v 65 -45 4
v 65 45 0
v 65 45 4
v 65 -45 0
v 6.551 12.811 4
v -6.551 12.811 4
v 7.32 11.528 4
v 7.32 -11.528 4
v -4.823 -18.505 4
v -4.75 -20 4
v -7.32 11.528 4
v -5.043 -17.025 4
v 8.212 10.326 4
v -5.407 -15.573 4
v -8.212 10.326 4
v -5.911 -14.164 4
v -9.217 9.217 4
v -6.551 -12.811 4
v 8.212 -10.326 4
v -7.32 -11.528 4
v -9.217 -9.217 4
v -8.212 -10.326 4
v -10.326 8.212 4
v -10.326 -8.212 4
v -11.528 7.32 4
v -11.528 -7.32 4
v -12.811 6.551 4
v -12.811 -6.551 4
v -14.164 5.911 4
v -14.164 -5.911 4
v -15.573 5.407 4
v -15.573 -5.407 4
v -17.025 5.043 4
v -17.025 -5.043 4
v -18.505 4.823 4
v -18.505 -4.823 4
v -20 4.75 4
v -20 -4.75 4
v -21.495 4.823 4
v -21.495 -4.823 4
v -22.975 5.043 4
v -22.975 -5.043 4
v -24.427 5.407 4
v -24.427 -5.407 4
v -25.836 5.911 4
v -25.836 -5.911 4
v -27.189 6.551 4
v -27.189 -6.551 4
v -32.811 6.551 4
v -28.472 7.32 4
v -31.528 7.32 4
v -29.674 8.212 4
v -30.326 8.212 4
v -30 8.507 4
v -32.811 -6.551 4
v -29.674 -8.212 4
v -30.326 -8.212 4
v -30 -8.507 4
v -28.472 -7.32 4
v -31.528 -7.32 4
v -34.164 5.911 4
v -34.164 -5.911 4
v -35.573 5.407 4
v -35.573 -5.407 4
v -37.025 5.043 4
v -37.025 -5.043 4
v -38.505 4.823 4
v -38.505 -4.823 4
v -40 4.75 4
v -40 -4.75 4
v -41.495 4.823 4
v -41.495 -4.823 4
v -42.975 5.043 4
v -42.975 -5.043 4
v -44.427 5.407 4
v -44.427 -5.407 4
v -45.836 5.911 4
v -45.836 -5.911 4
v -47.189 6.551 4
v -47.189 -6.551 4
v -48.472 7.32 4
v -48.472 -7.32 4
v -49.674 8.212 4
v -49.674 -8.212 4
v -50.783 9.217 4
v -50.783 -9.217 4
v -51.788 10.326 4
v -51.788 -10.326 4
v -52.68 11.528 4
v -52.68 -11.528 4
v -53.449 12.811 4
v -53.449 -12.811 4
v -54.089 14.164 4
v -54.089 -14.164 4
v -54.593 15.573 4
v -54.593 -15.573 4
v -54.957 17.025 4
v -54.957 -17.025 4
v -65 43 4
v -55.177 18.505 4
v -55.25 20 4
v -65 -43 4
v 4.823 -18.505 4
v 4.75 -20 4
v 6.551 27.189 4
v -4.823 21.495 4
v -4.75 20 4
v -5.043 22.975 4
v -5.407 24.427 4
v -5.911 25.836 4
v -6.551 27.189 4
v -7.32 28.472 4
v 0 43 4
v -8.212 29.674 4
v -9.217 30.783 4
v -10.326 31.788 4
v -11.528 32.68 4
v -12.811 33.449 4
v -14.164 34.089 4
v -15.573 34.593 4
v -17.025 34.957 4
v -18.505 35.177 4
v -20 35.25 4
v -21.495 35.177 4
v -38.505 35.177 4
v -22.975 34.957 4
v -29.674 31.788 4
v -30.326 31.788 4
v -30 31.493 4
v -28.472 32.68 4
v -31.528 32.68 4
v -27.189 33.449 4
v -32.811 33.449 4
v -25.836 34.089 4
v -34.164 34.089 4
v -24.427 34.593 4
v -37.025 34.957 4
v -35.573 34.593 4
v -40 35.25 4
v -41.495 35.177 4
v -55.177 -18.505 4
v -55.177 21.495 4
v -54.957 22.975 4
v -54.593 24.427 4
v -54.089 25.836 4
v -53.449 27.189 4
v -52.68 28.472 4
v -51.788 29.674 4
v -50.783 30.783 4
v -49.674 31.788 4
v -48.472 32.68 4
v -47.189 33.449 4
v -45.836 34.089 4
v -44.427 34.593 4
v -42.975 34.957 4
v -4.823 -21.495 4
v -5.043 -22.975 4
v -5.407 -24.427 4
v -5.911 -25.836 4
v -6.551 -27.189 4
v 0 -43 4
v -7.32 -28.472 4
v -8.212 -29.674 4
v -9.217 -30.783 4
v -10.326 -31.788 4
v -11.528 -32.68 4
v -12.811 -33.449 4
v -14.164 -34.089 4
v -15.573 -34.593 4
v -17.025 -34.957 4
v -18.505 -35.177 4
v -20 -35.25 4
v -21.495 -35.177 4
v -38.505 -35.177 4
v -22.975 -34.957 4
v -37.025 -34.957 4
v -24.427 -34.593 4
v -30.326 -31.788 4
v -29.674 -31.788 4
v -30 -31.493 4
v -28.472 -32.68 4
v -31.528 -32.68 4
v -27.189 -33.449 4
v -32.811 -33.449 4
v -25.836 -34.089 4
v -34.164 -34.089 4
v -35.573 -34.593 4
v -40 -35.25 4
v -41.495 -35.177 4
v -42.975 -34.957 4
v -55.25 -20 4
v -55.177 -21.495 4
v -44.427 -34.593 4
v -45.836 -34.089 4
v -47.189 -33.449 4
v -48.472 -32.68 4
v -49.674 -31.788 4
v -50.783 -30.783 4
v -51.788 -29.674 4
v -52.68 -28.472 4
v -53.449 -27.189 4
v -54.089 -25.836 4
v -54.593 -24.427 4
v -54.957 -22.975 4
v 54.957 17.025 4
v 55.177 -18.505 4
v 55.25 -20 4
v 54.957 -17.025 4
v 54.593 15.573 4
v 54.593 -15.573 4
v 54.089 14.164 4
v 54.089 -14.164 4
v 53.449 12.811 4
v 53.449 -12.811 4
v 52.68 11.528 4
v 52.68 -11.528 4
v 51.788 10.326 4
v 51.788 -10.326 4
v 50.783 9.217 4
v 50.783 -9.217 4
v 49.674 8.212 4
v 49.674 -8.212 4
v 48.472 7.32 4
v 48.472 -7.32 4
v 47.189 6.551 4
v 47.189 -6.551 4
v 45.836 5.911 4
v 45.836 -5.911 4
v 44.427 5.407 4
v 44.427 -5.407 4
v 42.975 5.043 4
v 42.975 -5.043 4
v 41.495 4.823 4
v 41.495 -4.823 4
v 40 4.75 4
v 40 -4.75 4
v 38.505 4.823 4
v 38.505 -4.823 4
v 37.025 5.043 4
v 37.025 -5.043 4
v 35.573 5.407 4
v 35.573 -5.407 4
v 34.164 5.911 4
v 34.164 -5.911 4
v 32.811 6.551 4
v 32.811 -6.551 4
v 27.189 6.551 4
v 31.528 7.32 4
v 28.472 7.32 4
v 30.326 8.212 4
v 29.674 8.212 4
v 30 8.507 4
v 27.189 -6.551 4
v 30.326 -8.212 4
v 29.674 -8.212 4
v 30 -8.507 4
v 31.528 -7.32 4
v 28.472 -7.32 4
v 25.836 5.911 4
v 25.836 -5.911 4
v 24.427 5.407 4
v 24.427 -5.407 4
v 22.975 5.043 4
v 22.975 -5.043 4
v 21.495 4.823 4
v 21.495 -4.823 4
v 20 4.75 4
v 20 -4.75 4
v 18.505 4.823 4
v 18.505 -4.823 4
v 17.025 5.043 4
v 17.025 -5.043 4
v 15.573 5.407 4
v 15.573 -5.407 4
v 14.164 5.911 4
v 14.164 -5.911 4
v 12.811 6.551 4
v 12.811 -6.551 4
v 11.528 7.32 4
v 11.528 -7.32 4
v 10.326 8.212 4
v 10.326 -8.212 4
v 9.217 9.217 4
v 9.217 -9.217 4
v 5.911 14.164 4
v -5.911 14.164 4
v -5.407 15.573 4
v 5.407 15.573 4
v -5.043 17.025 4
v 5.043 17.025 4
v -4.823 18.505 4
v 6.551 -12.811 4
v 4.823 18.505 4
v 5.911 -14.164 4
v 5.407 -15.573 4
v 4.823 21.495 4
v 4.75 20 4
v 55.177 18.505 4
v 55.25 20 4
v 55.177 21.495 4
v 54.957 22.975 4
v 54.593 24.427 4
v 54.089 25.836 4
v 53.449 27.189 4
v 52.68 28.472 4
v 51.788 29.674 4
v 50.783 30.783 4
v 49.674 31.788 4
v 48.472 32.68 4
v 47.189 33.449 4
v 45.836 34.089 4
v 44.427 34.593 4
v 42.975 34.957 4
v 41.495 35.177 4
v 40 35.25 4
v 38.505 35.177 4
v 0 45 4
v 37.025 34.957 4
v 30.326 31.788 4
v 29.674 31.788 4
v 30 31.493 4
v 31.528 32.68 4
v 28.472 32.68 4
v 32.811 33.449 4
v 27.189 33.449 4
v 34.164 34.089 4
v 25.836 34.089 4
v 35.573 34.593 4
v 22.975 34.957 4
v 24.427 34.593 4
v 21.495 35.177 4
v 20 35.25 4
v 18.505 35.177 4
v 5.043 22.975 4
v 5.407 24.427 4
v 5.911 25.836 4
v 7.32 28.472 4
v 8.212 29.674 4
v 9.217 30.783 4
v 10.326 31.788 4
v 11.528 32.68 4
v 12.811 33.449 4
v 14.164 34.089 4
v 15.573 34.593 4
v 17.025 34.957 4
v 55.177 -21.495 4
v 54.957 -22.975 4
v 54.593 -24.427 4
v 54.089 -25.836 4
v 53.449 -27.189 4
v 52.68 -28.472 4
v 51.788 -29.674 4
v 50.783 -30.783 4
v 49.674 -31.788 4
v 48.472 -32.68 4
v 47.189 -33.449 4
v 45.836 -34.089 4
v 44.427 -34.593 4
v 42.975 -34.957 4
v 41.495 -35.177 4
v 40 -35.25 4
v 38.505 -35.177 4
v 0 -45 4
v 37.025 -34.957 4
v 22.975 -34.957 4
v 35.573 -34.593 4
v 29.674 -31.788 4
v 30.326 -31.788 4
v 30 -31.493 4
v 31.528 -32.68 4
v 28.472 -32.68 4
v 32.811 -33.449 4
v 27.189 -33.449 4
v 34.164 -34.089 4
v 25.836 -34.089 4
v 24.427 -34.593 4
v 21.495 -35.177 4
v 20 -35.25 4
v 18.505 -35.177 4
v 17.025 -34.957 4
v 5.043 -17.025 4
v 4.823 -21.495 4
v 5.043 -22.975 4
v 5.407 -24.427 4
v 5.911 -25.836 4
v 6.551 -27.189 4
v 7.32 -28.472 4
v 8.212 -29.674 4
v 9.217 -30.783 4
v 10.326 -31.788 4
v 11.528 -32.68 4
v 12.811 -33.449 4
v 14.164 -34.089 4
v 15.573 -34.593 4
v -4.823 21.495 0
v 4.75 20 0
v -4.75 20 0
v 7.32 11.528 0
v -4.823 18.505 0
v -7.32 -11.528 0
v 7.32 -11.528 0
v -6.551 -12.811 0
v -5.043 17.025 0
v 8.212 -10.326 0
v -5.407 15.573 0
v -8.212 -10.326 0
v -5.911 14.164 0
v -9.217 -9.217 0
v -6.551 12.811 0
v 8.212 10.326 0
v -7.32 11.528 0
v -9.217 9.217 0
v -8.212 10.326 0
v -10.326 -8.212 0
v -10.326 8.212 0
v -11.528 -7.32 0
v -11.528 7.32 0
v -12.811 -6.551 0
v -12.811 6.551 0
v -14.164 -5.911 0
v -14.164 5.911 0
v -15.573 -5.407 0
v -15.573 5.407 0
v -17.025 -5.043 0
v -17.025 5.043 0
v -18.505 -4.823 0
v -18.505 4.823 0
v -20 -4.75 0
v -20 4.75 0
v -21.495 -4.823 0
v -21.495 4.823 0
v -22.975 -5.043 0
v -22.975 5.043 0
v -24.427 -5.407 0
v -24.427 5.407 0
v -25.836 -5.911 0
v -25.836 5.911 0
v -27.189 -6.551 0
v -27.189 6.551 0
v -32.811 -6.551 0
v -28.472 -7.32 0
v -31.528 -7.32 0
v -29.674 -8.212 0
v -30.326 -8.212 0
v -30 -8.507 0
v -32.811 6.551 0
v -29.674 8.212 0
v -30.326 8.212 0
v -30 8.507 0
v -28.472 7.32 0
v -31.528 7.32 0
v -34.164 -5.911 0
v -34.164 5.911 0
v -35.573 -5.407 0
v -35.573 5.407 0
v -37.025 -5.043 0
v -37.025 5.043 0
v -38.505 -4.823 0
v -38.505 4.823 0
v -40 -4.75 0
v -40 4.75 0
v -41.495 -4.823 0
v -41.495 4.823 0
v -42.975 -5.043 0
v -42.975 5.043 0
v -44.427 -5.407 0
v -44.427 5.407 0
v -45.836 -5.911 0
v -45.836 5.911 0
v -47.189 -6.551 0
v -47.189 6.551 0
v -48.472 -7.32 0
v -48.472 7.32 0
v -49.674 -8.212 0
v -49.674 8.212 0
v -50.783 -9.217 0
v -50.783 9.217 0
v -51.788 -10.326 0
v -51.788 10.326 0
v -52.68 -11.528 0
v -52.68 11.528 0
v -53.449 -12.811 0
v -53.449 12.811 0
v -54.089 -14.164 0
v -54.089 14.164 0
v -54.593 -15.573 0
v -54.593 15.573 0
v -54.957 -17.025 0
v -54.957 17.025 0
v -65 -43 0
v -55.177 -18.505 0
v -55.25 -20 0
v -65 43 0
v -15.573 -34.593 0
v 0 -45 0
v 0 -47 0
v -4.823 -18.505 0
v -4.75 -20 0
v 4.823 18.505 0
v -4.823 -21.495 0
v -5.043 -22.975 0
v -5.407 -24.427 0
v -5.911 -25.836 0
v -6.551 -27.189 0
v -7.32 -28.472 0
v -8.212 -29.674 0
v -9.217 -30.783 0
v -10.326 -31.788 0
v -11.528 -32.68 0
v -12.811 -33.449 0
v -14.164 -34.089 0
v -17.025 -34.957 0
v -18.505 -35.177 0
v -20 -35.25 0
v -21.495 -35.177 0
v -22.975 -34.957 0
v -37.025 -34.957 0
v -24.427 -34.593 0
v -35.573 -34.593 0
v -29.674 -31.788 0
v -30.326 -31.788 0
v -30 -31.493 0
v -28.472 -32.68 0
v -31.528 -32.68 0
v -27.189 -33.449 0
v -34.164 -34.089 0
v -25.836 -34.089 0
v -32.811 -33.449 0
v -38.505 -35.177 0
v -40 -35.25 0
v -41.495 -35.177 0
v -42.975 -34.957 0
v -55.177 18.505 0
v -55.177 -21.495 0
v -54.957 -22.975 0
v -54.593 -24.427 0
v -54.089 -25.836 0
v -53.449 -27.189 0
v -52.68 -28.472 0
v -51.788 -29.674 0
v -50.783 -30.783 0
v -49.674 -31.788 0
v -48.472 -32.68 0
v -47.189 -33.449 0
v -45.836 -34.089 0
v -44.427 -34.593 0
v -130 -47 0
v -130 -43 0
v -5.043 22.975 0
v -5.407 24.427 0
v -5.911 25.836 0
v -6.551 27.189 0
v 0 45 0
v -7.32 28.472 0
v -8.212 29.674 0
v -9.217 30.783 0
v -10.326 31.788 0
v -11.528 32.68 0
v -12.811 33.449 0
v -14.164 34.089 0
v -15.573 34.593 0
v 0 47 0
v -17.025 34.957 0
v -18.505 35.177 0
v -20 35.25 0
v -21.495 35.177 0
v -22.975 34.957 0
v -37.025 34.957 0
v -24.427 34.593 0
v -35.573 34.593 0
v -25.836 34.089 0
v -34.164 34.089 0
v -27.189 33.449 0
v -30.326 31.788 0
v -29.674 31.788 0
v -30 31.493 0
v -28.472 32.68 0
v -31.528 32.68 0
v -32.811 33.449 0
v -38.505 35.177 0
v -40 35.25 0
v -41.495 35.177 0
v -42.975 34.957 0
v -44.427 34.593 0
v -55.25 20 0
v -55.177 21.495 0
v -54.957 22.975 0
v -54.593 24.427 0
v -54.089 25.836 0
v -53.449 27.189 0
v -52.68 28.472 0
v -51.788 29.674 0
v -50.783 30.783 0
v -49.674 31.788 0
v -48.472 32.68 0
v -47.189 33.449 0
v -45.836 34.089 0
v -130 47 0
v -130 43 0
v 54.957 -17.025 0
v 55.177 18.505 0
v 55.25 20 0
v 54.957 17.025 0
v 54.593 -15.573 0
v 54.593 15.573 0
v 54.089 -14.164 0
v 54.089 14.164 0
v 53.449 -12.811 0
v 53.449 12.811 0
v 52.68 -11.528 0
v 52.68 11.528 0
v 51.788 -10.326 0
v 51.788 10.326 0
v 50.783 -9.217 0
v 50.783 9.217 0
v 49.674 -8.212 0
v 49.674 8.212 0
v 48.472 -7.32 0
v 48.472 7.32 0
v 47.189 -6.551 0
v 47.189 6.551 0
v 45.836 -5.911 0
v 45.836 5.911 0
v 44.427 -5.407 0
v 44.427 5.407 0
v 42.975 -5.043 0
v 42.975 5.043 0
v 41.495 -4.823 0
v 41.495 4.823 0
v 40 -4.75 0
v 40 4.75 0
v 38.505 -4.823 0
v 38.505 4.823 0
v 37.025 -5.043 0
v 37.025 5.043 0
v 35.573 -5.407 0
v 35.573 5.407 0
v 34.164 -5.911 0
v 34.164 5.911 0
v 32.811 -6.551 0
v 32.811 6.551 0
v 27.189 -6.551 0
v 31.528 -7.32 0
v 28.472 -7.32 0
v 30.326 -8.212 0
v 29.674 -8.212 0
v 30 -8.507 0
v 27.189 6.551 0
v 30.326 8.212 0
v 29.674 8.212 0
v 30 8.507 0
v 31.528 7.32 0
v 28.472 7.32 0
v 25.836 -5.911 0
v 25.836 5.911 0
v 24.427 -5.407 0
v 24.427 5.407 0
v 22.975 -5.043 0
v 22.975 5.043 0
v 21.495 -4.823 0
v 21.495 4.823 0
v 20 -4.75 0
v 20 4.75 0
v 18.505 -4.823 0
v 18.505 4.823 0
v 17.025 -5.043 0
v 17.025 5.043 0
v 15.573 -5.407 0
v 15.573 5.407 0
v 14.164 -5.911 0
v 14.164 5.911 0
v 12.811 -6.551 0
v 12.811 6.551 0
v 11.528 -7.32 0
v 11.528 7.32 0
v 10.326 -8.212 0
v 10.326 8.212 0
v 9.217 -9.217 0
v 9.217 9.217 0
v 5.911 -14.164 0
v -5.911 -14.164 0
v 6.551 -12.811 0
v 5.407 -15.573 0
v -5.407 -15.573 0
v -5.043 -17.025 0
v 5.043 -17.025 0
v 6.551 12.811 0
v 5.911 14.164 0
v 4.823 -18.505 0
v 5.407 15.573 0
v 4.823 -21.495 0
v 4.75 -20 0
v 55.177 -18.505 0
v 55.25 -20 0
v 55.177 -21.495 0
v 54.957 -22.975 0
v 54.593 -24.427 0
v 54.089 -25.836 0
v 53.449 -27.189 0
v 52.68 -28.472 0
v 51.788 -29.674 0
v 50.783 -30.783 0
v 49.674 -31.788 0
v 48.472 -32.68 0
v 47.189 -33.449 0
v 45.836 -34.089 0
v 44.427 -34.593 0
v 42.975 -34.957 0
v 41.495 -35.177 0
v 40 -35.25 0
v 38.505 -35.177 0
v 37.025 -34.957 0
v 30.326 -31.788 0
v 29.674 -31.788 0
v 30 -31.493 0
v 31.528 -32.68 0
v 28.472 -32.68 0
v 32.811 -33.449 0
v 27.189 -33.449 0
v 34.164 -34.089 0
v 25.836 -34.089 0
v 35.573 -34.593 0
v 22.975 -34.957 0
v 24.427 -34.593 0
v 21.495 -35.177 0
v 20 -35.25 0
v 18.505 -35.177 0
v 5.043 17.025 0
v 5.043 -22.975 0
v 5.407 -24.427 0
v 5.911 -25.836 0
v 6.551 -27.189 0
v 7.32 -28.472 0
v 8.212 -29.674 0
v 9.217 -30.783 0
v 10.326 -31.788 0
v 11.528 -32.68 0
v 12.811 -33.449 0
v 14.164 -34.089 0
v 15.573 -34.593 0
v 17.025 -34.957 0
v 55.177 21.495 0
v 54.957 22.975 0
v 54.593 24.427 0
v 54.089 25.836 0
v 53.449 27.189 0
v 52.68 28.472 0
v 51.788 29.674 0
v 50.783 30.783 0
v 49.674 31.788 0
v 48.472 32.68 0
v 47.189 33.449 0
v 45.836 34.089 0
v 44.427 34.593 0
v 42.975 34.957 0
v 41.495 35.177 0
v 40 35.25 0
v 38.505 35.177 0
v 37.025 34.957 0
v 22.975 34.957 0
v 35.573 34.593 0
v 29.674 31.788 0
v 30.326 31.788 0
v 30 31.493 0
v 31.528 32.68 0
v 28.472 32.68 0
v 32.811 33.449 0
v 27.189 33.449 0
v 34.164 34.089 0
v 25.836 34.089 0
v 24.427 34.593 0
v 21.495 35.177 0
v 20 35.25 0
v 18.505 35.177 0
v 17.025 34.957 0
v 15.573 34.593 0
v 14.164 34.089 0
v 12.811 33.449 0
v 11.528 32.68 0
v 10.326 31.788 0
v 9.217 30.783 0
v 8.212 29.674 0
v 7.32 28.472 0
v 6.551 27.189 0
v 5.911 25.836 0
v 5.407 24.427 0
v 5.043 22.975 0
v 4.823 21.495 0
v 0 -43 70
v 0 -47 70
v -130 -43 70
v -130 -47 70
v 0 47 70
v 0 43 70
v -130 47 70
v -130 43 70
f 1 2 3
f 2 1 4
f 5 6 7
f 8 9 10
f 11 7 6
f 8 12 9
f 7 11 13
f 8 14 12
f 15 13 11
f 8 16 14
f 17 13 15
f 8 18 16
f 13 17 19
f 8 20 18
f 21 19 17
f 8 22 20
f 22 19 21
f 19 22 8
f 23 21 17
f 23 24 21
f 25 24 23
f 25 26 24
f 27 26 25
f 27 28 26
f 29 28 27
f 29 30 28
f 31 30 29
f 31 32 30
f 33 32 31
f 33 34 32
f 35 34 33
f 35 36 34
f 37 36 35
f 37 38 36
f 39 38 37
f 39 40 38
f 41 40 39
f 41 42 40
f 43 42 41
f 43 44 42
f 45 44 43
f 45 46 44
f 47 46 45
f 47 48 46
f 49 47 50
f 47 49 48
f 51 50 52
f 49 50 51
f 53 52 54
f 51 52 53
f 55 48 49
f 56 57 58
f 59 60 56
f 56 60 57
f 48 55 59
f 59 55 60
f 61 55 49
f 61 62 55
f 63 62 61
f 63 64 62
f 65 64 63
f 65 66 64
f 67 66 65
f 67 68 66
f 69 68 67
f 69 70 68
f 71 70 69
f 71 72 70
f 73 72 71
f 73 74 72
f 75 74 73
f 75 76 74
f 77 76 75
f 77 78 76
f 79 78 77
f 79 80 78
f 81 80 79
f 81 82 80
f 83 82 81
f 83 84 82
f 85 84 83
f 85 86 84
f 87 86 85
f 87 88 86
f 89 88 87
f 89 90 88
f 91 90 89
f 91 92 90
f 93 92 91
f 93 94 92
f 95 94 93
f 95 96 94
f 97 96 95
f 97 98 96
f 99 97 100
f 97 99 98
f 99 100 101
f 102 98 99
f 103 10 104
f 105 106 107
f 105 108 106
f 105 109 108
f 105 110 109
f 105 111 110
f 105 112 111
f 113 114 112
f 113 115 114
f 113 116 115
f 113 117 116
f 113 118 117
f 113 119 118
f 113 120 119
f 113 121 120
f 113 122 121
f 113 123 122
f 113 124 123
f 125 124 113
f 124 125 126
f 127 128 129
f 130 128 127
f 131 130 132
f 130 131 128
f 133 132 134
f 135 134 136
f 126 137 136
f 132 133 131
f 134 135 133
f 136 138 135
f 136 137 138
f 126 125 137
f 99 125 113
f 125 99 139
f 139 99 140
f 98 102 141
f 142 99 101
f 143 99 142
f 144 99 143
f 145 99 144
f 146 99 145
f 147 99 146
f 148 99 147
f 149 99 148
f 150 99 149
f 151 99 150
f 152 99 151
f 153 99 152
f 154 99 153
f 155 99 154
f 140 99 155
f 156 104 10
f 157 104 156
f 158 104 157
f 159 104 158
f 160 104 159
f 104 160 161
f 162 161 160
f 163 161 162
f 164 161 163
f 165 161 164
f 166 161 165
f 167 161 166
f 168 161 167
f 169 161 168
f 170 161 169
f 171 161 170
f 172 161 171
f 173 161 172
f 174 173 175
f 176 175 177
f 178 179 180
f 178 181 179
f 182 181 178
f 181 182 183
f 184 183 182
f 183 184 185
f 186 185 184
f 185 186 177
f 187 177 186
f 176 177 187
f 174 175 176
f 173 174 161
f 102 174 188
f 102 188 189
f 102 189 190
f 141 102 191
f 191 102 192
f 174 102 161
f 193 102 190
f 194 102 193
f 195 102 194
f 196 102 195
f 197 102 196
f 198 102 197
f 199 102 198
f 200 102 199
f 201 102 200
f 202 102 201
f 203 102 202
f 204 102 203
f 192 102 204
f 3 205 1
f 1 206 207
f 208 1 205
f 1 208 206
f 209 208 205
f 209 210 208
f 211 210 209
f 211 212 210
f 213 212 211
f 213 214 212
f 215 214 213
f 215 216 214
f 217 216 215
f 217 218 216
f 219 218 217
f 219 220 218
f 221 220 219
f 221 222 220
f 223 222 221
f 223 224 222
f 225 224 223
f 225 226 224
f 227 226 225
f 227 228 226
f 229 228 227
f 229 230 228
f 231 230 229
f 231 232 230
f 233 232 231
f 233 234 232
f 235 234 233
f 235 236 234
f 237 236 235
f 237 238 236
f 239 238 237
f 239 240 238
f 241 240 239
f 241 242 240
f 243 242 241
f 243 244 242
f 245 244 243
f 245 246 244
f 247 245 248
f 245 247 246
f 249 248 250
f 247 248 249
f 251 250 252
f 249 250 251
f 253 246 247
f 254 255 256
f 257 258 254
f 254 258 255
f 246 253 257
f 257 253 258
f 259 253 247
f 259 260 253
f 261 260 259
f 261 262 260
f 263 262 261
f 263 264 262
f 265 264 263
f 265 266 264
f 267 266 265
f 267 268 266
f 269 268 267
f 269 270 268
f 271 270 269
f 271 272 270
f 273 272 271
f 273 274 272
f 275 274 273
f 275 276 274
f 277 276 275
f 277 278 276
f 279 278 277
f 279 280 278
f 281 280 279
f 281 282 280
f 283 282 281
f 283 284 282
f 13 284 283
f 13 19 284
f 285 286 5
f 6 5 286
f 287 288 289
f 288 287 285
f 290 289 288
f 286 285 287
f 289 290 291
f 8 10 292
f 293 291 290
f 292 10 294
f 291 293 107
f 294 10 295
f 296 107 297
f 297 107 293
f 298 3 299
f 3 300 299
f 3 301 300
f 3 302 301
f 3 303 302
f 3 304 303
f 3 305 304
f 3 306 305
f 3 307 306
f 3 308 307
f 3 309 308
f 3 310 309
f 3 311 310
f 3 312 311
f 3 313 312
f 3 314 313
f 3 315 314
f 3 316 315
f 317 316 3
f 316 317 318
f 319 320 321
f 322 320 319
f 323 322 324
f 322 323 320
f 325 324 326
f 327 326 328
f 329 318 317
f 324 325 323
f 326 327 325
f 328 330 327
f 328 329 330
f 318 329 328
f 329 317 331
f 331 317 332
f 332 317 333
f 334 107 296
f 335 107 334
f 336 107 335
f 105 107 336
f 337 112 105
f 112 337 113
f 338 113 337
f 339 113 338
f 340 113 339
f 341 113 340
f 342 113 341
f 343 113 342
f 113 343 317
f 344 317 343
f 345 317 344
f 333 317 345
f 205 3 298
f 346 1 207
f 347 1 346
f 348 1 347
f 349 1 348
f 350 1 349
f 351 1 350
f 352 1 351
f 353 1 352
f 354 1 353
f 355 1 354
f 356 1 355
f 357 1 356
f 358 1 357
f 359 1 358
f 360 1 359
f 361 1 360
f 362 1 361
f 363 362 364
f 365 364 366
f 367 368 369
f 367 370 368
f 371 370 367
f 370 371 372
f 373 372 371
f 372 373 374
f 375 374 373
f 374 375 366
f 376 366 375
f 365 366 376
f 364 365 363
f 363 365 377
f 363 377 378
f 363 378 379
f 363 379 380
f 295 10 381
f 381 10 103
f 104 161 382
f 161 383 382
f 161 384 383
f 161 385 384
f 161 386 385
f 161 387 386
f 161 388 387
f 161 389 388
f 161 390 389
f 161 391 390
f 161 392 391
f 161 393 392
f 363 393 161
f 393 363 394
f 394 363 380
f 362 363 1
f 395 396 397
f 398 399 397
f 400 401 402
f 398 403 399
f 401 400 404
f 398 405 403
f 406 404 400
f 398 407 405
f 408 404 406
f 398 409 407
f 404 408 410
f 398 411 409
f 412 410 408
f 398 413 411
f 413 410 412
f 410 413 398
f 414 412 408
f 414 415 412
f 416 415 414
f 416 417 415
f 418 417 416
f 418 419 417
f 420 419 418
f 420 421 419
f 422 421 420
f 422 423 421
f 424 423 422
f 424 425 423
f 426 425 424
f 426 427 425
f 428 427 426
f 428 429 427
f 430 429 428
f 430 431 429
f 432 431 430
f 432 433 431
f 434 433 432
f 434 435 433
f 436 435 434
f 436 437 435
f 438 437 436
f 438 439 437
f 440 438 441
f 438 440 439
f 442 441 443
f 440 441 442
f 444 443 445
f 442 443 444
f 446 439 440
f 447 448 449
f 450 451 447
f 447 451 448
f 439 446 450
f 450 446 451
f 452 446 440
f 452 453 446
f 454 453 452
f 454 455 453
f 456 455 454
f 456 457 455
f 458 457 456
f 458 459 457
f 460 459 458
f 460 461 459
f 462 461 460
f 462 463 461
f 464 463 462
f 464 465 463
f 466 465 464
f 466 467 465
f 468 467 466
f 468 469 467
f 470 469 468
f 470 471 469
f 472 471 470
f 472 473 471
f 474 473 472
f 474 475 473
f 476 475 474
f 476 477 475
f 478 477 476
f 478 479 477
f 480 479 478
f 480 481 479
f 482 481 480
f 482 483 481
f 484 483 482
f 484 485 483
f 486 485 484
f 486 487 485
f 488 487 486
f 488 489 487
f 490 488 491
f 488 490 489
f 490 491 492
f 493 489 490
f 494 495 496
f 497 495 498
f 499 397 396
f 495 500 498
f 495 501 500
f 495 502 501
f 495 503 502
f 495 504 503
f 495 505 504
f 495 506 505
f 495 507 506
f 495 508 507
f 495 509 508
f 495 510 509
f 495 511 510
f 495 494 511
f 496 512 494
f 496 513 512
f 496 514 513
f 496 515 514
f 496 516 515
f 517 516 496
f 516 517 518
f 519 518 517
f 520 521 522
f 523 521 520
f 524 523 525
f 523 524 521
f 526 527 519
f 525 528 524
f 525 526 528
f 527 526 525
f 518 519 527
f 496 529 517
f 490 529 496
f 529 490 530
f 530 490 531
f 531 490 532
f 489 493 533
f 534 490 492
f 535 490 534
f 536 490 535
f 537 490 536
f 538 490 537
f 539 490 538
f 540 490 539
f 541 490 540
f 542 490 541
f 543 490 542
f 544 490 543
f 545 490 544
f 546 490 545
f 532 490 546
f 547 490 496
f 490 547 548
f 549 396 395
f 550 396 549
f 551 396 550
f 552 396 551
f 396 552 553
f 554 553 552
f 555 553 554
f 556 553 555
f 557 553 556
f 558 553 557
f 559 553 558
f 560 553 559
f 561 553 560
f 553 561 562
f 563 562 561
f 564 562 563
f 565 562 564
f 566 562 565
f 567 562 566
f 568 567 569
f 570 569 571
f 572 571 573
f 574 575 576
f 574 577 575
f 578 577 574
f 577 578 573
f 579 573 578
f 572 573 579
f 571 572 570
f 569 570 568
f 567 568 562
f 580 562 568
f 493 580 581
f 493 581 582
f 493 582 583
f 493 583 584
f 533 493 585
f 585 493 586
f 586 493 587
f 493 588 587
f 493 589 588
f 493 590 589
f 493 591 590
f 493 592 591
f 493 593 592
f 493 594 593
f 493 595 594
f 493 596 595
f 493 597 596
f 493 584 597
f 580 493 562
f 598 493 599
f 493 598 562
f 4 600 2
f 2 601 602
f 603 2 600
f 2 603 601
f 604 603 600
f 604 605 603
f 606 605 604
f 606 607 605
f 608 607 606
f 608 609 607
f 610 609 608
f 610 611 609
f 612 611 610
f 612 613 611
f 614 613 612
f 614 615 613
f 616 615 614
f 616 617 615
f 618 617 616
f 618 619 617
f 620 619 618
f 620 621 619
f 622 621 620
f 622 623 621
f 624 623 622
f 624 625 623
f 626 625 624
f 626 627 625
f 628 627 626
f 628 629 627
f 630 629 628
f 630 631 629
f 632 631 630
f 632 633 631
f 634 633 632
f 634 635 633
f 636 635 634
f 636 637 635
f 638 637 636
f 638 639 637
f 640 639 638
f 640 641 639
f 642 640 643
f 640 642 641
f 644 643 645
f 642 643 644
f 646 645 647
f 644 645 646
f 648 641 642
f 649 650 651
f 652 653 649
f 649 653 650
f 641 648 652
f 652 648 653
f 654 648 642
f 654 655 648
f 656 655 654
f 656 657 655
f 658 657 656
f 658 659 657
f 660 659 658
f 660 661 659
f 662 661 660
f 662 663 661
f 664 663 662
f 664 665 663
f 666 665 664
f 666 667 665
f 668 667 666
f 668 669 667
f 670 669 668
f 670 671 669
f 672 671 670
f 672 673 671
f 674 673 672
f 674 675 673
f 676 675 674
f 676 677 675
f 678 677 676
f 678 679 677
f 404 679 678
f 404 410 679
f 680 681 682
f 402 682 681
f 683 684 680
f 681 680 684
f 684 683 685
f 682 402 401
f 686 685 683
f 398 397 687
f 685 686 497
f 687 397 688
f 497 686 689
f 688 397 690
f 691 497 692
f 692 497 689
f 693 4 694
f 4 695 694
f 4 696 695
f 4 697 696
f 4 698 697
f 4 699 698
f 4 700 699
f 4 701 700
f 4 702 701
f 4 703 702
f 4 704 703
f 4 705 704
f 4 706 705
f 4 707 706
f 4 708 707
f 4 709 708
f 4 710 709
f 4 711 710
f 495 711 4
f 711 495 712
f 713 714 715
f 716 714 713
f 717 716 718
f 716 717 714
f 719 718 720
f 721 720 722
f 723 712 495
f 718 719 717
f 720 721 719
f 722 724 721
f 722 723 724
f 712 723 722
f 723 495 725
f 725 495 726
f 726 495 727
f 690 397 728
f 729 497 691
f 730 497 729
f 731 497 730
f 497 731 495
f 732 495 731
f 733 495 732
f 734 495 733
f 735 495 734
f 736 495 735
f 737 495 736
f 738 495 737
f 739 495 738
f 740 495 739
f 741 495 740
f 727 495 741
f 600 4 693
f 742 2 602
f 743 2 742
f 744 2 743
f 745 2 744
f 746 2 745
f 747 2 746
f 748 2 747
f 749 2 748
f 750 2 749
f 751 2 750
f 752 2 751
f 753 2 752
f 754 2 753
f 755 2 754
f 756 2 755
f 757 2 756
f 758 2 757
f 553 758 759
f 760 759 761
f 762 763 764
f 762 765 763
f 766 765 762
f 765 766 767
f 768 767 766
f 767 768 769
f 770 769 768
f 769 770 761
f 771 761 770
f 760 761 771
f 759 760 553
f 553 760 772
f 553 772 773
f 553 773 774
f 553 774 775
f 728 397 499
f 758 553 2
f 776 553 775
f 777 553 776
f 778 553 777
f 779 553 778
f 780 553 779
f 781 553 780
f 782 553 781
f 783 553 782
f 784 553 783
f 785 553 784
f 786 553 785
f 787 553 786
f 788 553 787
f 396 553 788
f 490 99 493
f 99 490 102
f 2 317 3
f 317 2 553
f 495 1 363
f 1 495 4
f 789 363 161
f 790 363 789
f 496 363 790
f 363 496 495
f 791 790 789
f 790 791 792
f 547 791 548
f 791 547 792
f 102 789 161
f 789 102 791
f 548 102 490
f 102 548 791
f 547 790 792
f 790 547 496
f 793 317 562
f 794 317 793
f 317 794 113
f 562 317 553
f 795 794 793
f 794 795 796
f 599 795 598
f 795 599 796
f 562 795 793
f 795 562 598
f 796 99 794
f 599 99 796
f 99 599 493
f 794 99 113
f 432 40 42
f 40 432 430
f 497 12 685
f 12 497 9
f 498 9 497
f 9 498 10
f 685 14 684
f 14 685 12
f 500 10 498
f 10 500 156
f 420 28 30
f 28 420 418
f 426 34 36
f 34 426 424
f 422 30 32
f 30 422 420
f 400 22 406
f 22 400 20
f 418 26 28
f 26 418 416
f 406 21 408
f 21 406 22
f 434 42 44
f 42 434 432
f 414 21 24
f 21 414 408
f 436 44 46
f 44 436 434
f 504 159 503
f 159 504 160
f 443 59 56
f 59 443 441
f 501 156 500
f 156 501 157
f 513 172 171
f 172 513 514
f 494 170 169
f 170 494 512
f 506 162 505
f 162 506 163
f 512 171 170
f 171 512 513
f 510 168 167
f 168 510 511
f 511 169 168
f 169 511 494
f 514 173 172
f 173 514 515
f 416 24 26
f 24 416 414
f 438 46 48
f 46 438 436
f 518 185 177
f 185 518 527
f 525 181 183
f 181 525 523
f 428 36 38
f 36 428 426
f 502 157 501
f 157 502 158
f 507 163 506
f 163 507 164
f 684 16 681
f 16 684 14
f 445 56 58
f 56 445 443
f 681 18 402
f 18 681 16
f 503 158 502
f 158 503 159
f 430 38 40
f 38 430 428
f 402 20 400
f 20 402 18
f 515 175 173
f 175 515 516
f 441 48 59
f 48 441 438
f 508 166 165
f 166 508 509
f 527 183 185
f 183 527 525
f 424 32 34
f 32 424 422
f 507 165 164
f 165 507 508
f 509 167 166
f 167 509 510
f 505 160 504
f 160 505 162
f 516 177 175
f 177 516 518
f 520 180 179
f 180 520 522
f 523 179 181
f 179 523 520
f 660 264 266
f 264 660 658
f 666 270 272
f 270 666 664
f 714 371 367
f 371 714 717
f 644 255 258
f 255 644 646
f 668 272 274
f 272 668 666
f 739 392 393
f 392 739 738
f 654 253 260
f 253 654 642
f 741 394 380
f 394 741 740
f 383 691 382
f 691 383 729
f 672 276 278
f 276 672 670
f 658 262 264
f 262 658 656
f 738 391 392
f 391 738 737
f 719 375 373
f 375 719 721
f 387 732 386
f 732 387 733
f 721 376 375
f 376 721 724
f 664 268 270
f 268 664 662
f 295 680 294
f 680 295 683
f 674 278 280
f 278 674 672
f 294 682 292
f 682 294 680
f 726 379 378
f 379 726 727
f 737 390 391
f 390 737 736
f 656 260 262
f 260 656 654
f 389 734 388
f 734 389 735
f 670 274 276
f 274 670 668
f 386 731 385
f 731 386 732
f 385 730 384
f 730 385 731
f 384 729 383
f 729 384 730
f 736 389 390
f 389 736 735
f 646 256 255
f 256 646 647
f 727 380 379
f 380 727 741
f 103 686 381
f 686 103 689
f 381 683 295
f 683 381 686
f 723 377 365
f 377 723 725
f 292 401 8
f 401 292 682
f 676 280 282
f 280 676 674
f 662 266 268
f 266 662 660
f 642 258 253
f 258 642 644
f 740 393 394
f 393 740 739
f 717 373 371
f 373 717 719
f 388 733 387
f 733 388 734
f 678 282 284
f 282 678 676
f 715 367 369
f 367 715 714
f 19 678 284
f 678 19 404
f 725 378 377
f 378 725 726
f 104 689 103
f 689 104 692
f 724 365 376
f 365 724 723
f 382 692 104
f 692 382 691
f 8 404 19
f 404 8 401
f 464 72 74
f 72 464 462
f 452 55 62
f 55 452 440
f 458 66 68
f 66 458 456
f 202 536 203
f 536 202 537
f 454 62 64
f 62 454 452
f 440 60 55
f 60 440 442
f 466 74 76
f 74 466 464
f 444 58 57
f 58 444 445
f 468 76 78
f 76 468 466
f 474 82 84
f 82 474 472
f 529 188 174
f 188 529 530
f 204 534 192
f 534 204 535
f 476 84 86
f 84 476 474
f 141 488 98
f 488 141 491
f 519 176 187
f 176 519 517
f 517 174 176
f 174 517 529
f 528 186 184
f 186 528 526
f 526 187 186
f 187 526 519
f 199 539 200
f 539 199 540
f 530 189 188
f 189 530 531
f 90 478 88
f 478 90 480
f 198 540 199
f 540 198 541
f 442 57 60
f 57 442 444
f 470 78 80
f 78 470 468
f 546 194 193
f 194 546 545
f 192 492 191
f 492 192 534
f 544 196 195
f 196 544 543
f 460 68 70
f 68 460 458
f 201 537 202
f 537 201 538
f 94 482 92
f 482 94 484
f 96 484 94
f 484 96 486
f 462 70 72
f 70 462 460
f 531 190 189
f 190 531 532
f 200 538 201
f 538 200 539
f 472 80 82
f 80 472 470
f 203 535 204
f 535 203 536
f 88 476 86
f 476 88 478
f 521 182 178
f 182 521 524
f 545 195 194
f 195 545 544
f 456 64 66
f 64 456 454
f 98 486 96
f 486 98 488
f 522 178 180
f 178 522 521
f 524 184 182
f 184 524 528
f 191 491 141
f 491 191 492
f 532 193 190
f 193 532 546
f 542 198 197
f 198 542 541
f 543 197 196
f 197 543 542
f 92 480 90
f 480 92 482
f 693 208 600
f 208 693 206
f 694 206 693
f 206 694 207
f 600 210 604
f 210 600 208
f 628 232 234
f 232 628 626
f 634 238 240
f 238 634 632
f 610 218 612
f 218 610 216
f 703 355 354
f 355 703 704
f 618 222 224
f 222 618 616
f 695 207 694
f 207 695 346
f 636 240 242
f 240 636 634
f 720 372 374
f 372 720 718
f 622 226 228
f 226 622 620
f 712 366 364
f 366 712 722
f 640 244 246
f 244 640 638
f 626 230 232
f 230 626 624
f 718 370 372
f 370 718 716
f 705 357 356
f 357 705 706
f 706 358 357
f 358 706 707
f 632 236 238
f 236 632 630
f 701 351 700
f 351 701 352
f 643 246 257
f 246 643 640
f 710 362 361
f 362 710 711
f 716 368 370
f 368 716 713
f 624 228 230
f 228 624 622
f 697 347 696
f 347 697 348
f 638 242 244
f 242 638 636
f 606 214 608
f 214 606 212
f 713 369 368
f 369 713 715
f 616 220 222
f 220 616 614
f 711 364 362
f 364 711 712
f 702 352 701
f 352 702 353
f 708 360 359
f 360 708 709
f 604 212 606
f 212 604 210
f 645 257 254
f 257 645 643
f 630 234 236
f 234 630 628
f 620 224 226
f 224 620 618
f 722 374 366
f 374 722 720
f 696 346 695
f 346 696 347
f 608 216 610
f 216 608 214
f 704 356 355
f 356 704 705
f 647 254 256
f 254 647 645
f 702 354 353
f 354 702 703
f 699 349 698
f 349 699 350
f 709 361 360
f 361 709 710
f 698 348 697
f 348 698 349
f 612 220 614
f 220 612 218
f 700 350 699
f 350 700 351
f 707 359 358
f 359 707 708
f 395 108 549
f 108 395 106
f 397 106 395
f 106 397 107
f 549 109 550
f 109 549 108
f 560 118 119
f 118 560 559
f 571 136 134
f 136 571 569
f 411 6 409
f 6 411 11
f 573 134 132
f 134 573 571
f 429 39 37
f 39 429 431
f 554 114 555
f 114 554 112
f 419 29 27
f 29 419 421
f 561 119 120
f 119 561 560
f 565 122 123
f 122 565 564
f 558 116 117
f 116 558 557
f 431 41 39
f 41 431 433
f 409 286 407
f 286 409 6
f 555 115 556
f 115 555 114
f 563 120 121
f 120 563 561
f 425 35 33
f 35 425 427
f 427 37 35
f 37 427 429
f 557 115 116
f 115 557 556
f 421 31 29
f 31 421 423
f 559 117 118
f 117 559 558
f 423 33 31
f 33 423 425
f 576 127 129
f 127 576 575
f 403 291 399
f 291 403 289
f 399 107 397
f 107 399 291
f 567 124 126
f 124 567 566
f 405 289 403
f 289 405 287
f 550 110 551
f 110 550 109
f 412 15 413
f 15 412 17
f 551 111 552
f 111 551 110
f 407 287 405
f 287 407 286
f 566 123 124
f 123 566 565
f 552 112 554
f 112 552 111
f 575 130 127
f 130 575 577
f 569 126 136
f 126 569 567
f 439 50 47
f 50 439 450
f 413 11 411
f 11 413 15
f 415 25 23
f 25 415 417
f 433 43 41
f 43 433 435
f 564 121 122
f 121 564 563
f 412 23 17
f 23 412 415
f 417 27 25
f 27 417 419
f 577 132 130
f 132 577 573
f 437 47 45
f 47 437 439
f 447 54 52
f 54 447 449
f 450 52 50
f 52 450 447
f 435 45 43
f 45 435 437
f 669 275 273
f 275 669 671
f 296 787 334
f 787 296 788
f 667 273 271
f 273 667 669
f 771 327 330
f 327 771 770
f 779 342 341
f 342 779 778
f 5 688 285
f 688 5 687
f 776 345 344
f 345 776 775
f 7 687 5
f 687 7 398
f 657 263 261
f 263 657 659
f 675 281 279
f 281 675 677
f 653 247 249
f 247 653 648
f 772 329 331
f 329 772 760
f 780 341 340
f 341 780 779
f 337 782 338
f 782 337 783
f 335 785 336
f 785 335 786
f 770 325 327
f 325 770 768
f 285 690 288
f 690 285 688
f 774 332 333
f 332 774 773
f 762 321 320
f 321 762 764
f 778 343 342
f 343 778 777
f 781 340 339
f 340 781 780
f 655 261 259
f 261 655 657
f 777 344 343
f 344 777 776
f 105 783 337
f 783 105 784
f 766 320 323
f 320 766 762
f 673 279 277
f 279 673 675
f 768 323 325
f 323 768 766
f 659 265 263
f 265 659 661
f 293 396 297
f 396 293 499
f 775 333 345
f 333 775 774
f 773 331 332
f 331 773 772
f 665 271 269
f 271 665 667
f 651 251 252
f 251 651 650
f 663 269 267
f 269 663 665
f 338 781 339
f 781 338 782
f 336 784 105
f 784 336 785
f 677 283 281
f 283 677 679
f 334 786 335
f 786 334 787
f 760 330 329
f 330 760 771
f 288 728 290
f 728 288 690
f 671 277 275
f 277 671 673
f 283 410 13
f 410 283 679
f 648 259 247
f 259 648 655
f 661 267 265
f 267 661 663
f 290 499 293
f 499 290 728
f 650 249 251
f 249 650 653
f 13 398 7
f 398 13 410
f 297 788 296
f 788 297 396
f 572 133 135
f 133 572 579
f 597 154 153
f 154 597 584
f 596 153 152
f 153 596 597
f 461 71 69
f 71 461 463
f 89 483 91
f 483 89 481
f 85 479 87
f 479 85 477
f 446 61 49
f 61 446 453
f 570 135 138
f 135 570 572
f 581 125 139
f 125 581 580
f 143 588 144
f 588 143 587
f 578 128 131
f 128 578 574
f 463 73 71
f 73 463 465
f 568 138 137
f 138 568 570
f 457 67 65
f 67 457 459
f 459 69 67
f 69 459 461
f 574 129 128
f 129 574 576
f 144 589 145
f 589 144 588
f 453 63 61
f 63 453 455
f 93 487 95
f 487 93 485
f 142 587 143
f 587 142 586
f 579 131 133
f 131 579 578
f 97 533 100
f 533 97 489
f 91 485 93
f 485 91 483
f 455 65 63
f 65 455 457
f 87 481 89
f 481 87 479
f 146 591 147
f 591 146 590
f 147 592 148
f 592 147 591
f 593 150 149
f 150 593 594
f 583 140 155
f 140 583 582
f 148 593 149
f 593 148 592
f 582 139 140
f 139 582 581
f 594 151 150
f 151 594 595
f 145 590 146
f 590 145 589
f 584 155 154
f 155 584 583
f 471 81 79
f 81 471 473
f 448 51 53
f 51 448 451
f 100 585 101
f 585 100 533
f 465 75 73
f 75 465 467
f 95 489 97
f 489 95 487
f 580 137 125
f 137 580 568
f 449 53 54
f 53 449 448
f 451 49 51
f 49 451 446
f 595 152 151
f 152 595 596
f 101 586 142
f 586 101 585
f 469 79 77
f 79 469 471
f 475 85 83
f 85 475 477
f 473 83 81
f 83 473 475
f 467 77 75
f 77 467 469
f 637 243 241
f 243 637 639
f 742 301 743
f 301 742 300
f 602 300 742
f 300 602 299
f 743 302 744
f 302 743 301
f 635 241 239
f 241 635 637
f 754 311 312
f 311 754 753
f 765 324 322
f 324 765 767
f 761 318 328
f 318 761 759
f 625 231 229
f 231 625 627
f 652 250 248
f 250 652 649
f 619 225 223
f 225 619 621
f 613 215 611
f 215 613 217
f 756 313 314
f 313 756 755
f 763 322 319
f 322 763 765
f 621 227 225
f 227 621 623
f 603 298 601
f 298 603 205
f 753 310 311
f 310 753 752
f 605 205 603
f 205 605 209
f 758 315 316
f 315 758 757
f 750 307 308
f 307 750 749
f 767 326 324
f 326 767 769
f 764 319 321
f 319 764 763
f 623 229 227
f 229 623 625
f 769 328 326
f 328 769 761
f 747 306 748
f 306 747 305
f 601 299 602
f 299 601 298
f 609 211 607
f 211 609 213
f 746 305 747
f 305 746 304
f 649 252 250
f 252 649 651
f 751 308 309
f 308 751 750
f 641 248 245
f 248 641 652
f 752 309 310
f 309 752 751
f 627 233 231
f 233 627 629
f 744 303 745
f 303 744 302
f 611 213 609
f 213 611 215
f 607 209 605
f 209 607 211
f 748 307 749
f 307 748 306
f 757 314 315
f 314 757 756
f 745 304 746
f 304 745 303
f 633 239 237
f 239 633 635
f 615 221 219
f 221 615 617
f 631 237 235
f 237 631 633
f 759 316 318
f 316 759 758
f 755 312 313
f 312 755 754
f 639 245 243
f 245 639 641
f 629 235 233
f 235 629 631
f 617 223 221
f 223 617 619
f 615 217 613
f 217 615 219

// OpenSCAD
// Built by bench/smallmodels/features/compiler.py from a list of features.
$fn = 64;
difference() {
  union() {
    translate([0, 0, 0]) translate([-65, -45, 0]) cube([130, 90, 4]);
    translate([-65, -45, 0]) translate([-65, -2, 0]) cube([130, 4, 70]);
    translate([-65, 45, 0]) translate([-65, -2, 0]) cube([130, 4, 70]);
  }
  union() {
    translate([-20, -20, -1]) rotate([0, 0, 0]) cylinder(d = 30.5, h = 72);
    translate([20, -20, -1]) rotate([0, 0, 0]) cylinder(d = 30.5, h = 72);
    translate([-40, -20, -1]) rotate([0, 0, 0]) cylinder(d = 30.5, h = 72);
    translate([40, -20, -1]) rotate([0, 0, 0]) cylinder(d = 30.5, h = 72);
    translate([-20, 20, -1]) rotate([0, 0, 0]) cylinder(d = 30.5, h = 72);
    translate([20, 20, -1]) rotate([0, 0, 0]) cylinder(d = 30.5, h = 72);
    translate([-40, 20, -1]) rotate([0, 0, 0]) cylinder(d = 30.5, h = 72);
    translate([40, 20, -1]) rotate([0, 0, 0]) cylinder(d = 30.5, h = 72);
  }
}
